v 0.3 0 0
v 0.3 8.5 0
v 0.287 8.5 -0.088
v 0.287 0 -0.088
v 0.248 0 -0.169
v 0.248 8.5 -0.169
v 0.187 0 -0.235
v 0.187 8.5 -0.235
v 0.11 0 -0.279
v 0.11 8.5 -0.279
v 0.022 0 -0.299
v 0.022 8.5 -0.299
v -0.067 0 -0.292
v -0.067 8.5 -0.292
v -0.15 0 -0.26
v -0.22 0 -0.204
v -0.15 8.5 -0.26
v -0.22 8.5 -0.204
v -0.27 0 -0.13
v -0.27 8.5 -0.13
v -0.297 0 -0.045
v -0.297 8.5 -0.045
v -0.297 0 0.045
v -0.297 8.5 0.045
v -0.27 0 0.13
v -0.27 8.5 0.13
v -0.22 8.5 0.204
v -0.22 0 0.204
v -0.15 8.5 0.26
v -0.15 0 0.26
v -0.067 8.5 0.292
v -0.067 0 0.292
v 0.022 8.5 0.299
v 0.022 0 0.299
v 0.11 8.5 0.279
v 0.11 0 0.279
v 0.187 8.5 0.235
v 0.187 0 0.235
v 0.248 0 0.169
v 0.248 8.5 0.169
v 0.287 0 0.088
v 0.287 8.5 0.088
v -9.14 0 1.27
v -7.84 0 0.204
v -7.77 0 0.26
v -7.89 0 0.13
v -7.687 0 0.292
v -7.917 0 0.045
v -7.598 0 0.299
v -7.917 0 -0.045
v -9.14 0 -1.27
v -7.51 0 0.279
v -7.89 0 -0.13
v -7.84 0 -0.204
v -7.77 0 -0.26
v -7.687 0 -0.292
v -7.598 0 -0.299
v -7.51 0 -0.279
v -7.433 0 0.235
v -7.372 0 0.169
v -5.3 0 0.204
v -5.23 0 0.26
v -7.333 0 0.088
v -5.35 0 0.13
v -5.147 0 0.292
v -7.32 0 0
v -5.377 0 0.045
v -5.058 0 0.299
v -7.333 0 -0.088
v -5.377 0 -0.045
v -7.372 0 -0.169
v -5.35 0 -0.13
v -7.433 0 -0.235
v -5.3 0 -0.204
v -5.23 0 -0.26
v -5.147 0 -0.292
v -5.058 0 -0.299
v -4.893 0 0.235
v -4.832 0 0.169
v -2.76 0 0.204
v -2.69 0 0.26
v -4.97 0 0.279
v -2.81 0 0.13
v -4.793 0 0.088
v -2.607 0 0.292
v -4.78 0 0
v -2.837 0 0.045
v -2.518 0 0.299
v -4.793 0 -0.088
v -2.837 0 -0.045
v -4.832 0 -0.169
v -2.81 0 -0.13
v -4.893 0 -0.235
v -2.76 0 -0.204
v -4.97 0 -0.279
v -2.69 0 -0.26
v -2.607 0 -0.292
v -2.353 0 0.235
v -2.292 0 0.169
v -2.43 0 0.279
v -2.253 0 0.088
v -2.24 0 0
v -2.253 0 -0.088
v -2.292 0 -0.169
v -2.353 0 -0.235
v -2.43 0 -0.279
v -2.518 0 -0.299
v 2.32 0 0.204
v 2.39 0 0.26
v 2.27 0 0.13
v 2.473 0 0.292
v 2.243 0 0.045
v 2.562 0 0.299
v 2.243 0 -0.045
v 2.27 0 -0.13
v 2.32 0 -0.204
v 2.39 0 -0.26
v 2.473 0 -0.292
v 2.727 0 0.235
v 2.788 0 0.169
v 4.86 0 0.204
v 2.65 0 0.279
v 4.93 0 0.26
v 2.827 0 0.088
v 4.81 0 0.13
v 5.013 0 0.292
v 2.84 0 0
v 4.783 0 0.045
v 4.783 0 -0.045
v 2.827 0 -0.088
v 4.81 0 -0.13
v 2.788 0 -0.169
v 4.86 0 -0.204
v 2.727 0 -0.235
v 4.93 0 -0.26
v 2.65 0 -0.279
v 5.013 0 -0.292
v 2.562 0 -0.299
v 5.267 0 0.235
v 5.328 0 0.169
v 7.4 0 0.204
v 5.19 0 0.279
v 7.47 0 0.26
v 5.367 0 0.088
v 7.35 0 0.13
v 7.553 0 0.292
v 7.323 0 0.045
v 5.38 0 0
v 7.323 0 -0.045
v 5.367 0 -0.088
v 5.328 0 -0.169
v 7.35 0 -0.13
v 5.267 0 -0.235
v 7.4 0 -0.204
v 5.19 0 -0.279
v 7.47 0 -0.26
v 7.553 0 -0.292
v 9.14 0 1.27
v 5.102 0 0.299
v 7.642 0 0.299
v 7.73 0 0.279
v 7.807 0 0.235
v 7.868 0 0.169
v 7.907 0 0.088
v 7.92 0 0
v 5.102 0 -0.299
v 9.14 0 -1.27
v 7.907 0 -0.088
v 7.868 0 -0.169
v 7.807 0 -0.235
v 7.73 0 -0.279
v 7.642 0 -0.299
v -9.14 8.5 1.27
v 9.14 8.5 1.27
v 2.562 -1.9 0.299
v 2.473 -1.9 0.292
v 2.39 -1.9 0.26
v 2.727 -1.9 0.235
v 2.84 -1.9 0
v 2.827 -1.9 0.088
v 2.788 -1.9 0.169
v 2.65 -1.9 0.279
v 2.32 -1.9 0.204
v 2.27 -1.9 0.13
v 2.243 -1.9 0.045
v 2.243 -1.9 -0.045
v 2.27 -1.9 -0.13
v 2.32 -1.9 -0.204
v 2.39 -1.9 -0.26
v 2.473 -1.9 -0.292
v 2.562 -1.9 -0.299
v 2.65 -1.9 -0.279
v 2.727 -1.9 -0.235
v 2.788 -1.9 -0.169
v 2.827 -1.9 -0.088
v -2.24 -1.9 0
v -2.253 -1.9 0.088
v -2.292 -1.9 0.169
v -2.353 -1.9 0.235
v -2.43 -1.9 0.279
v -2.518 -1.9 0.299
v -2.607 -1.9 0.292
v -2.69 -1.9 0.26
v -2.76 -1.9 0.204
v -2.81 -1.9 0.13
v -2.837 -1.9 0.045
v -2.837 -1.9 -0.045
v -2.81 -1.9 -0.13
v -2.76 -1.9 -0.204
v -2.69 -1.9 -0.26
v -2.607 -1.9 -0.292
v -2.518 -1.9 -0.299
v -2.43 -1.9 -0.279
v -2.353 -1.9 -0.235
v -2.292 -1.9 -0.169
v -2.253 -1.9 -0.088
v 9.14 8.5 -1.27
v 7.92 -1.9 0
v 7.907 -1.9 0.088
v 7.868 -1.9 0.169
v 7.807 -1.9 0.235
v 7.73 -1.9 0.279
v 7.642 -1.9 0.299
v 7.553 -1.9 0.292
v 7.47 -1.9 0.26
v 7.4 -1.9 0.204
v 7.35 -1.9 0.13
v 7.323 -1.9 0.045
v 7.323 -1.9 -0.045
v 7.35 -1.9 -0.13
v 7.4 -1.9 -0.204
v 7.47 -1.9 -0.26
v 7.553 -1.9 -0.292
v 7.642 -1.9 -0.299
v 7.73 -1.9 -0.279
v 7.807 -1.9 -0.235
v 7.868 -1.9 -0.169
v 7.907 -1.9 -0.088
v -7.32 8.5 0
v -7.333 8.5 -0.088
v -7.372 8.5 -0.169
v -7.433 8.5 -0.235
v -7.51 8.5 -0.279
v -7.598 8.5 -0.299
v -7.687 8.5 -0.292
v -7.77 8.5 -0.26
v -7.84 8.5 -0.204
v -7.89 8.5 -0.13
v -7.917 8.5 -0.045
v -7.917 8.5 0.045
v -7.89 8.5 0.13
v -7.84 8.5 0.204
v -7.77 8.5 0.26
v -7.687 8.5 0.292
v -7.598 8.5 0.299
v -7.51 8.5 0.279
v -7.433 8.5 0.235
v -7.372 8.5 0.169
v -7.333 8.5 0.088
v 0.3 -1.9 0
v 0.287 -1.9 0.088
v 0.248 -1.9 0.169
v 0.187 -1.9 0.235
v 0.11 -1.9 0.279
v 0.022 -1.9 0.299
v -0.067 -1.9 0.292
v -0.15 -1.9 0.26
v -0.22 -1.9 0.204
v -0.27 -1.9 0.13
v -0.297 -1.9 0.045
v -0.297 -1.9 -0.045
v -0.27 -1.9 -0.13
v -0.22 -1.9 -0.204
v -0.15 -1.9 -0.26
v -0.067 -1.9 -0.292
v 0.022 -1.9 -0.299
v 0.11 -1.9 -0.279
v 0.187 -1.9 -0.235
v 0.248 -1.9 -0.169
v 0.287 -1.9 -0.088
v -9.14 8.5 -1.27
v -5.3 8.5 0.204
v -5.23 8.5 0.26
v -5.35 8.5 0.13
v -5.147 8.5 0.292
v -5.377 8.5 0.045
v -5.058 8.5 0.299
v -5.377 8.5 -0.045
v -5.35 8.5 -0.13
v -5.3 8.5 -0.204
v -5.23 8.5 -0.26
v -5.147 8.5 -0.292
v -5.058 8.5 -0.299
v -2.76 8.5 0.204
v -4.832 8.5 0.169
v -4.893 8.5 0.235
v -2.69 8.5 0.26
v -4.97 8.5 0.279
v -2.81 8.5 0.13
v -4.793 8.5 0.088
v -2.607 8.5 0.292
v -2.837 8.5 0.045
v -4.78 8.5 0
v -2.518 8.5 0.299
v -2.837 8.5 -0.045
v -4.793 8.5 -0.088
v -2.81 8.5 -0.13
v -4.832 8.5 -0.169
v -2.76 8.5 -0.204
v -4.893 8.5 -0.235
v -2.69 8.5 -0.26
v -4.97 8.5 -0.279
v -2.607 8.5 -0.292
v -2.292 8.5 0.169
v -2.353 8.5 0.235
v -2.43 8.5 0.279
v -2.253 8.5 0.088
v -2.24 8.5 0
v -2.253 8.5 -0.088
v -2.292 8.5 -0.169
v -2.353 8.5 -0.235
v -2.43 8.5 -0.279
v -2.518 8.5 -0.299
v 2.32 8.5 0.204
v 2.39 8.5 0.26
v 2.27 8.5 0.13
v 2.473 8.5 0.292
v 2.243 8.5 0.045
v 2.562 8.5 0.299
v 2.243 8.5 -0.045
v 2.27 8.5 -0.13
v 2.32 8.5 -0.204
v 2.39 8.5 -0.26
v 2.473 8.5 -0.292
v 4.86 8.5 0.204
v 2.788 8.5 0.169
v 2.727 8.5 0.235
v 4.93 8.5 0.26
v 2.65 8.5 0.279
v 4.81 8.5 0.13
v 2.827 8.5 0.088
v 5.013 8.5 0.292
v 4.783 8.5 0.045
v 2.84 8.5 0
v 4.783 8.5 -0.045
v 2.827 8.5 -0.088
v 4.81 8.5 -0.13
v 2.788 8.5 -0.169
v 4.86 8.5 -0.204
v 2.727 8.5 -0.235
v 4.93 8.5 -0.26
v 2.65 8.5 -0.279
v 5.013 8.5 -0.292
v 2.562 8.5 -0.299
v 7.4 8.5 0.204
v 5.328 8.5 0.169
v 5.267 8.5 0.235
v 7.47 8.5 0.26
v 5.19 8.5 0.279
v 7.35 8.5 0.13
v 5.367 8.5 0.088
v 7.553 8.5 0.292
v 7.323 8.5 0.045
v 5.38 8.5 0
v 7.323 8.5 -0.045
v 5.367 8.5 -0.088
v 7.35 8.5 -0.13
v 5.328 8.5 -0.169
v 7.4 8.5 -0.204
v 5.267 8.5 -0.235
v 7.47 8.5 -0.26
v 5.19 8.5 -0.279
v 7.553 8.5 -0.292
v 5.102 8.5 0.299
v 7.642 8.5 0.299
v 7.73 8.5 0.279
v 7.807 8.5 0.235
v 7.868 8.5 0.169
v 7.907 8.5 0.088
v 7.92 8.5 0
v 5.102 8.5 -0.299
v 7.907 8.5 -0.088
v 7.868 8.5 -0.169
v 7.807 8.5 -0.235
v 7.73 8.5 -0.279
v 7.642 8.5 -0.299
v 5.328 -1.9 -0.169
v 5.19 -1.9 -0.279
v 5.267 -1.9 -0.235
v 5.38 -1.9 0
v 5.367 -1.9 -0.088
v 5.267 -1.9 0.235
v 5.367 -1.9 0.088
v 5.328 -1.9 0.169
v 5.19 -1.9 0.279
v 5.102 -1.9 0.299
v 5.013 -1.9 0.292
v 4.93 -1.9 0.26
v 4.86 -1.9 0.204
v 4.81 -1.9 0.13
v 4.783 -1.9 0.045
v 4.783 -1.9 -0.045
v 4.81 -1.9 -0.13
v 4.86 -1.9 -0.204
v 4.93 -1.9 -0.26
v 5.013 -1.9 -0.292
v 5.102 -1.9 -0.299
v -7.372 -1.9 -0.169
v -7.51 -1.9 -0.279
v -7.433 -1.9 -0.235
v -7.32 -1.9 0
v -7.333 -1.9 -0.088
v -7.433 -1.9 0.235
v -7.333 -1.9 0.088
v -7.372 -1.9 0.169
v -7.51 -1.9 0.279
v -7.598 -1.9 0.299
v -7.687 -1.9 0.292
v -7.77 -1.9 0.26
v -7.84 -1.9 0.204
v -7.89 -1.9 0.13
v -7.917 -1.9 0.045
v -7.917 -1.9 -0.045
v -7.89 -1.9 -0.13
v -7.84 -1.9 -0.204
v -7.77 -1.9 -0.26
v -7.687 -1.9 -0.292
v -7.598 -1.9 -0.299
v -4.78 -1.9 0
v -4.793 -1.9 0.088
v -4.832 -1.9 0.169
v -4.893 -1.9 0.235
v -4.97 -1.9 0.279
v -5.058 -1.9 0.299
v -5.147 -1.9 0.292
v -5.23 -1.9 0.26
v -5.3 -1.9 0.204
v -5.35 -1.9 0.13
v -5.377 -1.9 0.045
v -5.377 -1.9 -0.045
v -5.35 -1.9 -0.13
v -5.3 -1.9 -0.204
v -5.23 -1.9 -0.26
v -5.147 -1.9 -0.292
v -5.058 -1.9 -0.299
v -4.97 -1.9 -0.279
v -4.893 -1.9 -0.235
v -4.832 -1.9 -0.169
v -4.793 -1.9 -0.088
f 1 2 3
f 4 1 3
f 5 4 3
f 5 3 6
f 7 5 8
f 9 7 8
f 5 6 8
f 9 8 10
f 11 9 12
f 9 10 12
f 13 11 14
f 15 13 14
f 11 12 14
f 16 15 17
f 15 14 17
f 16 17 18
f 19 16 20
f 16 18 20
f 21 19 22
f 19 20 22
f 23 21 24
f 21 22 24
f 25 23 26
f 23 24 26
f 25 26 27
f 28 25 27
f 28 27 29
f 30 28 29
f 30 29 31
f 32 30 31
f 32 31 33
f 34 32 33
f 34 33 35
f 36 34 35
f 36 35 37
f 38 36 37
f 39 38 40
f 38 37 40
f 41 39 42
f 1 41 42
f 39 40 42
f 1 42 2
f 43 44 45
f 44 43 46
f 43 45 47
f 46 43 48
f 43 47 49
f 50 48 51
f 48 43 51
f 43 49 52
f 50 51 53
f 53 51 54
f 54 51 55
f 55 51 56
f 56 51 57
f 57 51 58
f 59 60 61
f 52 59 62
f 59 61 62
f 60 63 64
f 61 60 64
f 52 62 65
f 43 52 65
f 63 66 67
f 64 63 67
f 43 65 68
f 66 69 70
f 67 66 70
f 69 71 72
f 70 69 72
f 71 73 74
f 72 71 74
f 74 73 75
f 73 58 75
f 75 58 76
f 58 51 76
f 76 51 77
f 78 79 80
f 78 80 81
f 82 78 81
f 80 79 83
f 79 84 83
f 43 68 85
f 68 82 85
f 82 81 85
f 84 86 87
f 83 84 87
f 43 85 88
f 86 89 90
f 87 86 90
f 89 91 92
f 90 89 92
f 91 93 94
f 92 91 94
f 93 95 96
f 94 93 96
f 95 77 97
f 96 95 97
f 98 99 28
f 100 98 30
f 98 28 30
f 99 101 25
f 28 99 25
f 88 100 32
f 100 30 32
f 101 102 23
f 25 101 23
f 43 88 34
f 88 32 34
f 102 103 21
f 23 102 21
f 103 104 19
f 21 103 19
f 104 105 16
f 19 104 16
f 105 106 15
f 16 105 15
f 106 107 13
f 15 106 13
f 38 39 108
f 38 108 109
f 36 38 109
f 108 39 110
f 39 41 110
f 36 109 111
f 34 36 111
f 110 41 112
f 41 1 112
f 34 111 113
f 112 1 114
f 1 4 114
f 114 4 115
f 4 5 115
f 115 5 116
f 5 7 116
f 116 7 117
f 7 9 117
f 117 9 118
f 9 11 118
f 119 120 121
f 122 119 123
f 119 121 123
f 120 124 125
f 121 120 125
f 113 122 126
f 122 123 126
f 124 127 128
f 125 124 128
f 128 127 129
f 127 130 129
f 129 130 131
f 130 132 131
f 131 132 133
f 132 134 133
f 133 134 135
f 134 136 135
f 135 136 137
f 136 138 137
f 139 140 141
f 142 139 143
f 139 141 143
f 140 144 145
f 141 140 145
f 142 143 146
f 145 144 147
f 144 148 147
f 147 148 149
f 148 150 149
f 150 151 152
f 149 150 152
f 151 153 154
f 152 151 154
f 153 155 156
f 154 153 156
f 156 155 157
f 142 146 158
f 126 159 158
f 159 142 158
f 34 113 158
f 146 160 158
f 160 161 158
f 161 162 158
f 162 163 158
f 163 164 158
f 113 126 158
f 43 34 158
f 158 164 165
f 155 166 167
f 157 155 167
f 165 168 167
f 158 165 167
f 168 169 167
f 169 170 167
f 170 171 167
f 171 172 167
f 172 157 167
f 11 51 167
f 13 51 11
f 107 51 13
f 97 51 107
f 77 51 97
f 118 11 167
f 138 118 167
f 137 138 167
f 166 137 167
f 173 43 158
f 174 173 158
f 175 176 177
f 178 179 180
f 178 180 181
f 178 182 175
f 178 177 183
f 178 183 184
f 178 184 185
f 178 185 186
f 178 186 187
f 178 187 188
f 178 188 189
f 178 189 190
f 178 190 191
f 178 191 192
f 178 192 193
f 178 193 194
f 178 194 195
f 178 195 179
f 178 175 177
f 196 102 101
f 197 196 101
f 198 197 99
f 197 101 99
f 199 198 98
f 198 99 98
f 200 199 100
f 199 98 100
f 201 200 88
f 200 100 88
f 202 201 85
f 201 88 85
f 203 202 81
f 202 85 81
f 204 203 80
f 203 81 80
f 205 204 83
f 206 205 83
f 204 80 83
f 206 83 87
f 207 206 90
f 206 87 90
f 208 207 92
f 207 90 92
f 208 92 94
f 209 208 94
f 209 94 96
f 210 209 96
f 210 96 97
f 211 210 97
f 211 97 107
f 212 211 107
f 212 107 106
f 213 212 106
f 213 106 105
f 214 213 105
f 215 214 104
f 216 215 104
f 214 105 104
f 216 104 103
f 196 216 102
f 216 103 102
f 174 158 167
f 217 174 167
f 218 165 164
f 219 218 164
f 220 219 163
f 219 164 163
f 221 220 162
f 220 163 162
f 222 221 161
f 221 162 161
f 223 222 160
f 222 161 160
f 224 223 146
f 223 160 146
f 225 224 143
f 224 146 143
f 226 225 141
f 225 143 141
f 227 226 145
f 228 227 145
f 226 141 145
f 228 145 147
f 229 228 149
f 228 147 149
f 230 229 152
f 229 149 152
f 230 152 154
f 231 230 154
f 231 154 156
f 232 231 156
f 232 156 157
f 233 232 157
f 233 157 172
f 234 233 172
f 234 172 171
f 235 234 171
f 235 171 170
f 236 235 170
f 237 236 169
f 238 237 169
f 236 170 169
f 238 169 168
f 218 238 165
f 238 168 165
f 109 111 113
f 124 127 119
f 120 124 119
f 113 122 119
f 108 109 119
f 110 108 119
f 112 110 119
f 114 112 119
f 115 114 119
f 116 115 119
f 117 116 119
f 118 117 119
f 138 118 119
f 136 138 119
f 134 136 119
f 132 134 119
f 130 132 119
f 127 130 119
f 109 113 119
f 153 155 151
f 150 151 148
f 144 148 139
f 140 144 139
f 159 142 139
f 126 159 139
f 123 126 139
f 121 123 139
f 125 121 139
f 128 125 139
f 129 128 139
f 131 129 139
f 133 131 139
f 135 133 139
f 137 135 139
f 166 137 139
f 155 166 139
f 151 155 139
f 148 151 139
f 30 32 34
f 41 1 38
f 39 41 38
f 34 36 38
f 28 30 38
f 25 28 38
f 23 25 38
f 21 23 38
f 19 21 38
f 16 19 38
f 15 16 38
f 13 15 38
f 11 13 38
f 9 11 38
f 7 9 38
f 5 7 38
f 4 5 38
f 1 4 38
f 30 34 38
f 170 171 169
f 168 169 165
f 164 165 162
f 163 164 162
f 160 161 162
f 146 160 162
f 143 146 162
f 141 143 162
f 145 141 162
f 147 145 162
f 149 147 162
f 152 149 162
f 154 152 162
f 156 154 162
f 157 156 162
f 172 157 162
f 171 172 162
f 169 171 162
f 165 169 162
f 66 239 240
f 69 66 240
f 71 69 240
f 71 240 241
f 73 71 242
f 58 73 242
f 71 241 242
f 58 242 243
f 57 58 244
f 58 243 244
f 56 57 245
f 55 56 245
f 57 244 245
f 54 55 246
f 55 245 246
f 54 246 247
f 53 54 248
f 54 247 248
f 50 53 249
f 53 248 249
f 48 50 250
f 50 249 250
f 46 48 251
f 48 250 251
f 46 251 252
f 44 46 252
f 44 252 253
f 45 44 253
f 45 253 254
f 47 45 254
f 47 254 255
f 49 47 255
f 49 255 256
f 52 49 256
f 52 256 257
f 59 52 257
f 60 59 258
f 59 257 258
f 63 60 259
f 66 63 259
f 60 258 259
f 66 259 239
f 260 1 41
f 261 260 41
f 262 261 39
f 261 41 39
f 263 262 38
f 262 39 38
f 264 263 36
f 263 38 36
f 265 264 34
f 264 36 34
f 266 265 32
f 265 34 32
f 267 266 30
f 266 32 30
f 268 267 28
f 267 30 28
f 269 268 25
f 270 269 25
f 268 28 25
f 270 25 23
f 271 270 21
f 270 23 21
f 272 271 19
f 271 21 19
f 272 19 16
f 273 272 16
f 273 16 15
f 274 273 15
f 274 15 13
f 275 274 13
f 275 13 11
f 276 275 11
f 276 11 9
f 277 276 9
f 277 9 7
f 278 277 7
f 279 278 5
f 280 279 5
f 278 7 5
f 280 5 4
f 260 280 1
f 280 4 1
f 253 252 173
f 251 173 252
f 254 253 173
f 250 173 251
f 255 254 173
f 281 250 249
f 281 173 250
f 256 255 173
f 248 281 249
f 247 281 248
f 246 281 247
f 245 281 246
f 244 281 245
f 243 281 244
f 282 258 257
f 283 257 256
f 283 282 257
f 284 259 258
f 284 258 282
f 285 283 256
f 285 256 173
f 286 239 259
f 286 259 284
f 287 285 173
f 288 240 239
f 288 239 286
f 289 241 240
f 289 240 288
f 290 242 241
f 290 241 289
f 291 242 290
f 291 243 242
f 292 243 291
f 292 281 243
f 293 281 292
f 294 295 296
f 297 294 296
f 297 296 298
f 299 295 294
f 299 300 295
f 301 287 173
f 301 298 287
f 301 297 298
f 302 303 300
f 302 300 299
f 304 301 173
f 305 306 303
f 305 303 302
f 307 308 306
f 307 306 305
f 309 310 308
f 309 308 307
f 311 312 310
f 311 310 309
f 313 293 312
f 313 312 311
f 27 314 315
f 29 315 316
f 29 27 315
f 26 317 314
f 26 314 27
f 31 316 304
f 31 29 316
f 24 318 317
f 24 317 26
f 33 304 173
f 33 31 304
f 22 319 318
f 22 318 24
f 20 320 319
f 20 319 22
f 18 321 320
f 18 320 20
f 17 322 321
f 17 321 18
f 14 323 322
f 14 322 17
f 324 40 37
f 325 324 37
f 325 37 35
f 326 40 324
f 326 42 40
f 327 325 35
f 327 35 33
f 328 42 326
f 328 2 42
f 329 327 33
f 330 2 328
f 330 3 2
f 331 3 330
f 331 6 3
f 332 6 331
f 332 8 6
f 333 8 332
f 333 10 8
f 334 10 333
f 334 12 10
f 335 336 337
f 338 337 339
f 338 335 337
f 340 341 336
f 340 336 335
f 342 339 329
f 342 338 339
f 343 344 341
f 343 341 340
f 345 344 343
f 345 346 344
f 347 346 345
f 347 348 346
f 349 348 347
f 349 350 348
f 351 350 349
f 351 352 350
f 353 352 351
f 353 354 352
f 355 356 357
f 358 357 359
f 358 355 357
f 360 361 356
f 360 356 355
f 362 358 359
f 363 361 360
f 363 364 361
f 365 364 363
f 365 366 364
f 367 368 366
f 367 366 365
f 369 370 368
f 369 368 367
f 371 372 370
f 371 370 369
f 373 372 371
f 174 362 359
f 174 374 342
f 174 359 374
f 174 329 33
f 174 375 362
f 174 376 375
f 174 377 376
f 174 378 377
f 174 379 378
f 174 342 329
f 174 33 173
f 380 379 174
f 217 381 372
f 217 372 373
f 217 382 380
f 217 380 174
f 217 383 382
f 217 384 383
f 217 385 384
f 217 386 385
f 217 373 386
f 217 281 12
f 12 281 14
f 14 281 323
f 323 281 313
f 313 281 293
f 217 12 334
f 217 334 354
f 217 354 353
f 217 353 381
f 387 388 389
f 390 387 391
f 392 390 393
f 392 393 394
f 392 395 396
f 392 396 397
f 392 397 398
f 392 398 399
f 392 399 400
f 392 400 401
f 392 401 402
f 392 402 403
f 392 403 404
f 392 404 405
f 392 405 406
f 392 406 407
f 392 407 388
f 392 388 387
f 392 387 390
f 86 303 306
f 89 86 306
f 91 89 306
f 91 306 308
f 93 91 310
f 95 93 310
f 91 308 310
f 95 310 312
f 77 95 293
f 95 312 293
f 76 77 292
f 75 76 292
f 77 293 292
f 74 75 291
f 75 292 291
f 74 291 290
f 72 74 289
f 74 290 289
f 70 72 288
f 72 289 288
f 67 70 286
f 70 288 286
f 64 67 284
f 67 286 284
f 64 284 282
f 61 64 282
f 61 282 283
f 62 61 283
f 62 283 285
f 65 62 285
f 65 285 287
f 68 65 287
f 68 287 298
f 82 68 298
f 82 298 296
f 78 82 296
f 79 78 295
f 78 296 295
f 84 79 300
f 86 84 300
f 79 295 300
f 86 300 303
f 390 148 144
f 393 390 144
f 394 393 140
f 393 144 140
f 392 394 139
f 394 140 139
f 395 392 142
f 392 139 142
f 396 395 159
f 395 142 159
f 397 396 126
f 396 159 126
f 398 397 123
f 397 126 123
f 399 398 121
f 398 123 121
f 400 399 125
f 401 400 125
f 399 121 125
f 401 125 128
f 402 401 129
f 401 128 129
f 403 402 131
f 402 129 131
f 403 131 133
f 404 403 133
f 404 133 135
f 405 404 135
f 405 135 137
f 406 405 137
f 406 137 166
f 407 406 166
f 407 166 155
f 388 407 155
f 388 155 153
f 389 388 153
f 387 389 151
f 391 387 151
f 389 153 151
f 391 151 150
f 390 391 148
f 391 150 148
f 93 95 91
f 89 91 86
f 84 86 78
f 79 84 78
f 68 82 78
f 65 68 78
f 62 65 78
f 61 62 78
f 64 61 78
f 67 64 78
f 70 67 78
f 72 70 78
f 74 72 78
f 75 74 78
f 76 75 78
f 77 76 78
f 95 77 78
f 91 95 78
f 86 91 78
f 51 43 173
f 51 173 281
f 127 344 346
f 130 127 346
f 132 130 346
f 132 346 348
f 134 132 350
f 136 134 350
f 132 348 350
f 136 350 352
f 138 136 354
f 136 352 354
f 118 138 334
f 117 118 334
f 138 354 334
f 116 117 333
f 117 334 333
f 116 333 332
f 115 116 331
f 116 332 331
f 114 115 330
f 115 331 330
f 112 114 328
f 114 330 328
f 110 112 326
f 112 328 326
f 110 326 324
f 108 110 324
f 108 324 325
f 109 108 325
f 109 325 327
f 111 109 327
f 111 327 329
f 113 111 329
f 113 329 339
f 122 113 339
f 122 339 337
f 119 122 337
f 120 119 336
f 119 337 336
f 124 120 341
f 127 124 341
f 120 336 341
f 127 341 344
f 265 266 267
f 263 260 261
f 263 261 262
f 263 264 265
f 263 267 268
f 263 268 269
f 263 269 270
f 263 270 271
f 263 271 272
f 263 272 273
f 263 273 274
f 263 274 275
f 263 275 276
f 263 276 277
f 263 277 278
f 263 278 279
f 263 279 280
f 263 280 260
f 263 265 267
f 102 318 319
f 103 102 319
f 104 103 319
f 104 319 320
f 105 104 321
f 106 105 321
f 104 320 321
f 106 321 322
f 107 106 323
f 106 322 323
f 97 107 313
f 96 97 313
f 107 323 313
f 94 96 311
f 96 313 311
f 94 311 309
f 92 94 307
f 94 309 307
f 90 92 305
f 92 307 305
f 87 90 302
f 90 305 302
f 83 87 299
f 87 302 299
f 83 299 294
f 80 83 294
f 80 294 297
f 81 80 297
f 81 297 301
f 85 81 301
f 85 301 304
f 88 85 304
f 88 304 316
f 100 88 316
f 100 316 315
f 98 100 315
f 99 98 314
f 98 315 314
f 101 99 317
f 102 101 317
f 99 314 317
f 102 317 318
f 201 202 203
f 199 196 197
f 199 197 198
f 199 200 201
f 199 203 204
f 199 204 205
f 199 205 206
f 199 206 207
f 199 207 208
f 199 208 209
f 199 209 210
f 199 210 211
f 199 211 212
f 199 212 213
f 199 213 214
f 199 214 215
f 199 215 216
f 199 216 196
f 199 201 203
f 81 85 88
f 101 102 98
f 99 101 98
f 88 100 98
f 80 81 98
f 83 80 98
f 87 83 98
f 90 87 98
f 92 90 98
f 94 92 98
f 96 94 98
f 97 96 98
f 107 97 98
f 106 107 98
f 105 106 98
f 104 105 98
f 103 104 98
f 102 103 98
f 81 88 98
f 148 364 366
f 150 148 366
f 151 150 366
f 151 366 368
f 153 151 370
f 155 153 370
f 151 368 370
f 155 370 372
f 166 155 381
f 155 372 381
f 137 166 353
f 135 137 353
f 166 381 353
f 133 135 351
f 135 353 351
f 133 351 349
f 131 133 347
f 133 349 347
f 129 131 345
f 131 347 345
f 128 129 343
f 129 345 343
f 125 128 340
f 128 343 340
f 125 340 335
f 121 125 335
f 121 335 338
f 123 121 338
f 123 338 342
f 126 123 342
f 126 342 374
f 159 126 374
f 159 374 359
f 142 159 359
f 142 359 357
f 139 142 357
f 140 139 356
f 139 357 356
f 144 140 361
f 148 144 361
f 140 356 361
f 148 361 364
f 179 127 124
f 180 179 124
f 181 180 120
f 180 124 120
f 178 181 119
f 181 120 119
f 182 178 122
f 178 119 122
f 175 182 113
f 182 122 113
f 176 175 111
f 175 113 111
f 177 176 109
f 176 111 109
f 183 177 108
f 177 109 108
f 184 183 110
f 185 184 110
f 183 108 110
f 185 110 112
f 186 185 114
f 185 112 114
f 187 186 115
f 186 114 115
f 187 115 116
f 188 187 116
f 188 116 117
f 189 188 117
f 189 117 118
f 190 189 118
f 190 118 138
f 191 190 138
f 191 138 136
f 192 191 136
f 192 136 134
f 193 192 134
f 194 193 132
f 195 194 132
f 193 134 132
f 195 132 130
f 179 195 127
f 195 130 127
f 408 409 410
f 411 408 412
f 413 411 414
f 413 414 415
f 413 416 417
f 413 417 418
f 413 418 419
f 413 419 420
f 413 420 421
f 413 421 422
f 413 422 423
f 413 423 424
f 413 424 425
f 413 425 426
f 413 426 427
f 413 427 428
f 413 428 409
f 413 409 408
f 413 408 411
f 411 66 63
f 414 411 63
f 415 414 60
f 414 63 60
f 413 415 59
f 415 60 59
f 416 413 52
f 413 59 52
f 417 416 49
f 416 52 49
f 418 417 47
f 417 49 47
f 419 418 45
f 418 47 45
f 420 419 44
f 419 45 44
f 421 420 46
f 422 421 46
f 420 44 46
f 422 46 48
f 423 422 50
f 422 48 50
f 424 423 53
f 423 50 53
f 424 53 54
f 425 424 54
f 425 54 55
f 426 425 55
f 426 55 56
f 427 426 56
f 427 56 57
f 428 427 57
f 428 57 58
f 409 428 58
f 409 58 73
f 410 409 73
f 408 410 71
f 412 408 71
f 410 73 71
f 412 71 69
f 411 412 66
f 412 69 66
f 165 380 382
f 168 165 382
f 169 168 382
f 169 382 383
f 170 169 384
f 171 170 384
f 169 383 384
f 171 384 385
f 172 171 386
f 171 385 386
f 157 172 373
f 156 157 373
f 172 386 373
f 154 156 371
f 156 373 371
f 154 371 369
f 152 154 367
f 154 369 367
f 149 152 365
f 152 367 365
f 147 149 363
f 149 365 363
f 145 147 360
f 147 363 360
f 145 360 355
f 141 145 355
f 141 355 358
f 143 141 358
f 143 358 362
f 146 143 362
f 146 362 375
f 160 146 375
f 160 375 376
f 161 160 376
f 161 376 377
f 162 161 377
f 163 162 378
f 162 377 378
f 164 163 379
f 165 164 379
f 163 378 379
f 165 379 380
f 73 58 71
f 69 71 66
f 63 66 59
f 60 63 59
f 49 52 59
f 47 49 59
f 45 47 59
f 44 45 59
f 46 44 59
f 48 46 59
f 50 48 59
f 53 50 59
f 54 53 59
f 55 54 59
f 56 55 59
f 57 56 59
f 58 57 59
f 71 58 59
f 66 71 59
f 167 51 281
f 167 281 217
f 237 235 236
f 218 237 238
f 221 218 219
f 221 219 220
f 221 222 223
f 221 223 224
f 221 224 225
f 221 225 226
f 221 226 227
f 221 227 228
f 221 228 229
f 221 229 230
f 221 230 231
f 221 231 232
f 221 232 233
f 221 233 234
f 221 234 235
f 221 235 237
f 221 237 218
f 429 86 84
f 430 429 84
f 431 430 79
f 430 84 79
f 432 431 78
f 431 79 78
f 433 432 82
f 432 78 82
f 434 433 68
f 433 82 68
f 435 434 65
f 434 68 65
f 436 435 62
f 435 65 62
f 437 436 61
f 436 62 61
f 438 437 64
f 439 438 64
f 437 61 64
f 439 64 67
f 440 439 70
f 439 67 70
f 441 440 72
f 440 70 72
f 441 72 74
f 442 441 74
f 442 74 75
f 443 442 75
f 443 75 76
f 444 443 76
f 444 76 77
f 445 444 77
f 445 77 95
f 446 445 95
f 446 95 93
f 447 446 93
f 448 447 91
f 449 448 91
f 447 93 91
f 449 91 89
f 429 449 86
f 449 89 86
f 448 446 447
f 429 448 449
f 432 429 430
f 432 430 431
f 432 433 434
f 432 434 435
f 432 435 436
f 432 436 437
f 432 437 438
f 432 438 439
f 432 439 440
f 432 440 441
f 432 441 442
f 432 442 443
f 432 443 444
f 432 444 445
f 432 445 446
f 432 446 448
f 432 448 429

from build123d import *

# Parameters (mm, degrees)
SKETCH_1_W          = 18.28
SKETCH_1_H          = 2.54
EXTRUDE_1_DEPTH     = 8.5
SKETCH_2_R          = 0.3
CUT_EXTRUDE_1_DEPTH = 8.5
SKETCH_3_R          = 0.3
EXTRUDE_2_DEPTH     = 1.9
EXTRUDE_2_2_DEPTH   = 1.9
EXTRUDE_2_3_DEPTH   = 1.9
EXTRUDE_2_4_DEPTH   = 1.9
EXTRUDE_2_5_DEPTH   = 1.9
EXTRUDE_2_6_DEPTH   = 1.9
EXTRUDE_2_7_DEPTH   = 1.9


with BuildPart() as part:
    # Эскиз1 → Бобышка-Вытянуть1 (new body)
    with BuildSketch(Plane(origin=(0, 0, 0), x_dir=(1, 0, 0), z_dir=(0, 1, 0))):
        Rectangle(SKETCH_1_W, SKETCH_1_H)
    extrude(amount=EXTRUDE_1_DEPTH)

    # Эскиз2 → Вырез-Вытянуть1 (cut)
    with BuildSketch(Plane(origin=(0, 8.5, 0), x_dir=(1, 0, 0), z_dir=(0, 1, 0))):
        with Locations((-7.62, 0)):
            Circle(SKETCH_2_R)
        with Locations((-5.08, 0)):
            Circle(SKETCH_2_R)
        with Locations((-2.54, 0)):
            Circle(SKETCH_2_R)
        Circle(SKETCH_2_R)
        with Locations((2.54, 0)):
            Circle(SKETCH_2_R)
        with Locations((5.08, 0)):
            Circle(SKETCH_2_R)
        with Locations((7.62, 0)):
            Circle(SKETCH_2_R)
    extrude(amount=-CUT_EXTRUDE_1_DEPTH, mode=Mode.SUBTRACT)


with BuildPart() as body_2:
    # Эскиз3 → Бобышка-Вытянуть2 (new body)
    with BuildSketch(Plane.XZ):
        with Locations((-7.62, 0)):
            Circle(SKETCH_3_R)
    extrude(amount=EXTRUDE_2_DEPTH)


with BuildPart() as body_3:
    # Эскиз3 → Extrude 2 2 (new body)
    with BuildSketch(Plane.XZ):
        with Locations((-5.08, 0)):
            Circle(SKETCH_3_R)
    extrude(amount=EXTRUDE_2_2_DEPTH)


with BuildPart() as body_4:
    # Эскиз3 → Extrude 2 3 (new body)
    with BuildSketch(Plane.XZ):
        with Locations((-2.54, 0)):
            Circle(SKETCH_3_R)
    extrude(amount=EXTRUDE_2_3_DEPTH)


with BuildPart() as body_5:
    # Эскиз3 → Extrude 2 4 (new body)
    with BuildSketch(Plane.XZ):
        Circle(SKETCH_3_R)
    extrude(amount=EXTRUDE_2_4_DEPTH)


with BuildPart() as body_6:
    # Эскиз3 → Extrude 2 5 (new body)
    with BuildSketch(Plane.XZ):
        with Locations((2.54, 0)):
            Circle(SKETCH_3_R)
    extrude(amount=EXTRUDE_2_5_DEPTH)


with BuildPart() as body_7:
    # Эскиз3 → Extrude 2 6 (new body)
    with BuildSketch(Plane.XZ):
        with Locations((5.08, 0)):
            Circle(SKETCH_3_R)
    extrude(amount=EXTRUDE_2_6_DEPTH)


with BuildPart() as body_8:
    # Эскиз3 → Extrude 2 7 (new body)
    with BuildSketch(Plane.XZ):
        with Locations((7.62, 0)):
            Circle(SKETCH_3_R)
    extrude(amount=EXTRUDE_2_7_DEPTH)


solid = Compound([part.part, body_2.part, body_3.part, body_4.part, body_5.part, body_6.part, body_7.part, body_8.part])
